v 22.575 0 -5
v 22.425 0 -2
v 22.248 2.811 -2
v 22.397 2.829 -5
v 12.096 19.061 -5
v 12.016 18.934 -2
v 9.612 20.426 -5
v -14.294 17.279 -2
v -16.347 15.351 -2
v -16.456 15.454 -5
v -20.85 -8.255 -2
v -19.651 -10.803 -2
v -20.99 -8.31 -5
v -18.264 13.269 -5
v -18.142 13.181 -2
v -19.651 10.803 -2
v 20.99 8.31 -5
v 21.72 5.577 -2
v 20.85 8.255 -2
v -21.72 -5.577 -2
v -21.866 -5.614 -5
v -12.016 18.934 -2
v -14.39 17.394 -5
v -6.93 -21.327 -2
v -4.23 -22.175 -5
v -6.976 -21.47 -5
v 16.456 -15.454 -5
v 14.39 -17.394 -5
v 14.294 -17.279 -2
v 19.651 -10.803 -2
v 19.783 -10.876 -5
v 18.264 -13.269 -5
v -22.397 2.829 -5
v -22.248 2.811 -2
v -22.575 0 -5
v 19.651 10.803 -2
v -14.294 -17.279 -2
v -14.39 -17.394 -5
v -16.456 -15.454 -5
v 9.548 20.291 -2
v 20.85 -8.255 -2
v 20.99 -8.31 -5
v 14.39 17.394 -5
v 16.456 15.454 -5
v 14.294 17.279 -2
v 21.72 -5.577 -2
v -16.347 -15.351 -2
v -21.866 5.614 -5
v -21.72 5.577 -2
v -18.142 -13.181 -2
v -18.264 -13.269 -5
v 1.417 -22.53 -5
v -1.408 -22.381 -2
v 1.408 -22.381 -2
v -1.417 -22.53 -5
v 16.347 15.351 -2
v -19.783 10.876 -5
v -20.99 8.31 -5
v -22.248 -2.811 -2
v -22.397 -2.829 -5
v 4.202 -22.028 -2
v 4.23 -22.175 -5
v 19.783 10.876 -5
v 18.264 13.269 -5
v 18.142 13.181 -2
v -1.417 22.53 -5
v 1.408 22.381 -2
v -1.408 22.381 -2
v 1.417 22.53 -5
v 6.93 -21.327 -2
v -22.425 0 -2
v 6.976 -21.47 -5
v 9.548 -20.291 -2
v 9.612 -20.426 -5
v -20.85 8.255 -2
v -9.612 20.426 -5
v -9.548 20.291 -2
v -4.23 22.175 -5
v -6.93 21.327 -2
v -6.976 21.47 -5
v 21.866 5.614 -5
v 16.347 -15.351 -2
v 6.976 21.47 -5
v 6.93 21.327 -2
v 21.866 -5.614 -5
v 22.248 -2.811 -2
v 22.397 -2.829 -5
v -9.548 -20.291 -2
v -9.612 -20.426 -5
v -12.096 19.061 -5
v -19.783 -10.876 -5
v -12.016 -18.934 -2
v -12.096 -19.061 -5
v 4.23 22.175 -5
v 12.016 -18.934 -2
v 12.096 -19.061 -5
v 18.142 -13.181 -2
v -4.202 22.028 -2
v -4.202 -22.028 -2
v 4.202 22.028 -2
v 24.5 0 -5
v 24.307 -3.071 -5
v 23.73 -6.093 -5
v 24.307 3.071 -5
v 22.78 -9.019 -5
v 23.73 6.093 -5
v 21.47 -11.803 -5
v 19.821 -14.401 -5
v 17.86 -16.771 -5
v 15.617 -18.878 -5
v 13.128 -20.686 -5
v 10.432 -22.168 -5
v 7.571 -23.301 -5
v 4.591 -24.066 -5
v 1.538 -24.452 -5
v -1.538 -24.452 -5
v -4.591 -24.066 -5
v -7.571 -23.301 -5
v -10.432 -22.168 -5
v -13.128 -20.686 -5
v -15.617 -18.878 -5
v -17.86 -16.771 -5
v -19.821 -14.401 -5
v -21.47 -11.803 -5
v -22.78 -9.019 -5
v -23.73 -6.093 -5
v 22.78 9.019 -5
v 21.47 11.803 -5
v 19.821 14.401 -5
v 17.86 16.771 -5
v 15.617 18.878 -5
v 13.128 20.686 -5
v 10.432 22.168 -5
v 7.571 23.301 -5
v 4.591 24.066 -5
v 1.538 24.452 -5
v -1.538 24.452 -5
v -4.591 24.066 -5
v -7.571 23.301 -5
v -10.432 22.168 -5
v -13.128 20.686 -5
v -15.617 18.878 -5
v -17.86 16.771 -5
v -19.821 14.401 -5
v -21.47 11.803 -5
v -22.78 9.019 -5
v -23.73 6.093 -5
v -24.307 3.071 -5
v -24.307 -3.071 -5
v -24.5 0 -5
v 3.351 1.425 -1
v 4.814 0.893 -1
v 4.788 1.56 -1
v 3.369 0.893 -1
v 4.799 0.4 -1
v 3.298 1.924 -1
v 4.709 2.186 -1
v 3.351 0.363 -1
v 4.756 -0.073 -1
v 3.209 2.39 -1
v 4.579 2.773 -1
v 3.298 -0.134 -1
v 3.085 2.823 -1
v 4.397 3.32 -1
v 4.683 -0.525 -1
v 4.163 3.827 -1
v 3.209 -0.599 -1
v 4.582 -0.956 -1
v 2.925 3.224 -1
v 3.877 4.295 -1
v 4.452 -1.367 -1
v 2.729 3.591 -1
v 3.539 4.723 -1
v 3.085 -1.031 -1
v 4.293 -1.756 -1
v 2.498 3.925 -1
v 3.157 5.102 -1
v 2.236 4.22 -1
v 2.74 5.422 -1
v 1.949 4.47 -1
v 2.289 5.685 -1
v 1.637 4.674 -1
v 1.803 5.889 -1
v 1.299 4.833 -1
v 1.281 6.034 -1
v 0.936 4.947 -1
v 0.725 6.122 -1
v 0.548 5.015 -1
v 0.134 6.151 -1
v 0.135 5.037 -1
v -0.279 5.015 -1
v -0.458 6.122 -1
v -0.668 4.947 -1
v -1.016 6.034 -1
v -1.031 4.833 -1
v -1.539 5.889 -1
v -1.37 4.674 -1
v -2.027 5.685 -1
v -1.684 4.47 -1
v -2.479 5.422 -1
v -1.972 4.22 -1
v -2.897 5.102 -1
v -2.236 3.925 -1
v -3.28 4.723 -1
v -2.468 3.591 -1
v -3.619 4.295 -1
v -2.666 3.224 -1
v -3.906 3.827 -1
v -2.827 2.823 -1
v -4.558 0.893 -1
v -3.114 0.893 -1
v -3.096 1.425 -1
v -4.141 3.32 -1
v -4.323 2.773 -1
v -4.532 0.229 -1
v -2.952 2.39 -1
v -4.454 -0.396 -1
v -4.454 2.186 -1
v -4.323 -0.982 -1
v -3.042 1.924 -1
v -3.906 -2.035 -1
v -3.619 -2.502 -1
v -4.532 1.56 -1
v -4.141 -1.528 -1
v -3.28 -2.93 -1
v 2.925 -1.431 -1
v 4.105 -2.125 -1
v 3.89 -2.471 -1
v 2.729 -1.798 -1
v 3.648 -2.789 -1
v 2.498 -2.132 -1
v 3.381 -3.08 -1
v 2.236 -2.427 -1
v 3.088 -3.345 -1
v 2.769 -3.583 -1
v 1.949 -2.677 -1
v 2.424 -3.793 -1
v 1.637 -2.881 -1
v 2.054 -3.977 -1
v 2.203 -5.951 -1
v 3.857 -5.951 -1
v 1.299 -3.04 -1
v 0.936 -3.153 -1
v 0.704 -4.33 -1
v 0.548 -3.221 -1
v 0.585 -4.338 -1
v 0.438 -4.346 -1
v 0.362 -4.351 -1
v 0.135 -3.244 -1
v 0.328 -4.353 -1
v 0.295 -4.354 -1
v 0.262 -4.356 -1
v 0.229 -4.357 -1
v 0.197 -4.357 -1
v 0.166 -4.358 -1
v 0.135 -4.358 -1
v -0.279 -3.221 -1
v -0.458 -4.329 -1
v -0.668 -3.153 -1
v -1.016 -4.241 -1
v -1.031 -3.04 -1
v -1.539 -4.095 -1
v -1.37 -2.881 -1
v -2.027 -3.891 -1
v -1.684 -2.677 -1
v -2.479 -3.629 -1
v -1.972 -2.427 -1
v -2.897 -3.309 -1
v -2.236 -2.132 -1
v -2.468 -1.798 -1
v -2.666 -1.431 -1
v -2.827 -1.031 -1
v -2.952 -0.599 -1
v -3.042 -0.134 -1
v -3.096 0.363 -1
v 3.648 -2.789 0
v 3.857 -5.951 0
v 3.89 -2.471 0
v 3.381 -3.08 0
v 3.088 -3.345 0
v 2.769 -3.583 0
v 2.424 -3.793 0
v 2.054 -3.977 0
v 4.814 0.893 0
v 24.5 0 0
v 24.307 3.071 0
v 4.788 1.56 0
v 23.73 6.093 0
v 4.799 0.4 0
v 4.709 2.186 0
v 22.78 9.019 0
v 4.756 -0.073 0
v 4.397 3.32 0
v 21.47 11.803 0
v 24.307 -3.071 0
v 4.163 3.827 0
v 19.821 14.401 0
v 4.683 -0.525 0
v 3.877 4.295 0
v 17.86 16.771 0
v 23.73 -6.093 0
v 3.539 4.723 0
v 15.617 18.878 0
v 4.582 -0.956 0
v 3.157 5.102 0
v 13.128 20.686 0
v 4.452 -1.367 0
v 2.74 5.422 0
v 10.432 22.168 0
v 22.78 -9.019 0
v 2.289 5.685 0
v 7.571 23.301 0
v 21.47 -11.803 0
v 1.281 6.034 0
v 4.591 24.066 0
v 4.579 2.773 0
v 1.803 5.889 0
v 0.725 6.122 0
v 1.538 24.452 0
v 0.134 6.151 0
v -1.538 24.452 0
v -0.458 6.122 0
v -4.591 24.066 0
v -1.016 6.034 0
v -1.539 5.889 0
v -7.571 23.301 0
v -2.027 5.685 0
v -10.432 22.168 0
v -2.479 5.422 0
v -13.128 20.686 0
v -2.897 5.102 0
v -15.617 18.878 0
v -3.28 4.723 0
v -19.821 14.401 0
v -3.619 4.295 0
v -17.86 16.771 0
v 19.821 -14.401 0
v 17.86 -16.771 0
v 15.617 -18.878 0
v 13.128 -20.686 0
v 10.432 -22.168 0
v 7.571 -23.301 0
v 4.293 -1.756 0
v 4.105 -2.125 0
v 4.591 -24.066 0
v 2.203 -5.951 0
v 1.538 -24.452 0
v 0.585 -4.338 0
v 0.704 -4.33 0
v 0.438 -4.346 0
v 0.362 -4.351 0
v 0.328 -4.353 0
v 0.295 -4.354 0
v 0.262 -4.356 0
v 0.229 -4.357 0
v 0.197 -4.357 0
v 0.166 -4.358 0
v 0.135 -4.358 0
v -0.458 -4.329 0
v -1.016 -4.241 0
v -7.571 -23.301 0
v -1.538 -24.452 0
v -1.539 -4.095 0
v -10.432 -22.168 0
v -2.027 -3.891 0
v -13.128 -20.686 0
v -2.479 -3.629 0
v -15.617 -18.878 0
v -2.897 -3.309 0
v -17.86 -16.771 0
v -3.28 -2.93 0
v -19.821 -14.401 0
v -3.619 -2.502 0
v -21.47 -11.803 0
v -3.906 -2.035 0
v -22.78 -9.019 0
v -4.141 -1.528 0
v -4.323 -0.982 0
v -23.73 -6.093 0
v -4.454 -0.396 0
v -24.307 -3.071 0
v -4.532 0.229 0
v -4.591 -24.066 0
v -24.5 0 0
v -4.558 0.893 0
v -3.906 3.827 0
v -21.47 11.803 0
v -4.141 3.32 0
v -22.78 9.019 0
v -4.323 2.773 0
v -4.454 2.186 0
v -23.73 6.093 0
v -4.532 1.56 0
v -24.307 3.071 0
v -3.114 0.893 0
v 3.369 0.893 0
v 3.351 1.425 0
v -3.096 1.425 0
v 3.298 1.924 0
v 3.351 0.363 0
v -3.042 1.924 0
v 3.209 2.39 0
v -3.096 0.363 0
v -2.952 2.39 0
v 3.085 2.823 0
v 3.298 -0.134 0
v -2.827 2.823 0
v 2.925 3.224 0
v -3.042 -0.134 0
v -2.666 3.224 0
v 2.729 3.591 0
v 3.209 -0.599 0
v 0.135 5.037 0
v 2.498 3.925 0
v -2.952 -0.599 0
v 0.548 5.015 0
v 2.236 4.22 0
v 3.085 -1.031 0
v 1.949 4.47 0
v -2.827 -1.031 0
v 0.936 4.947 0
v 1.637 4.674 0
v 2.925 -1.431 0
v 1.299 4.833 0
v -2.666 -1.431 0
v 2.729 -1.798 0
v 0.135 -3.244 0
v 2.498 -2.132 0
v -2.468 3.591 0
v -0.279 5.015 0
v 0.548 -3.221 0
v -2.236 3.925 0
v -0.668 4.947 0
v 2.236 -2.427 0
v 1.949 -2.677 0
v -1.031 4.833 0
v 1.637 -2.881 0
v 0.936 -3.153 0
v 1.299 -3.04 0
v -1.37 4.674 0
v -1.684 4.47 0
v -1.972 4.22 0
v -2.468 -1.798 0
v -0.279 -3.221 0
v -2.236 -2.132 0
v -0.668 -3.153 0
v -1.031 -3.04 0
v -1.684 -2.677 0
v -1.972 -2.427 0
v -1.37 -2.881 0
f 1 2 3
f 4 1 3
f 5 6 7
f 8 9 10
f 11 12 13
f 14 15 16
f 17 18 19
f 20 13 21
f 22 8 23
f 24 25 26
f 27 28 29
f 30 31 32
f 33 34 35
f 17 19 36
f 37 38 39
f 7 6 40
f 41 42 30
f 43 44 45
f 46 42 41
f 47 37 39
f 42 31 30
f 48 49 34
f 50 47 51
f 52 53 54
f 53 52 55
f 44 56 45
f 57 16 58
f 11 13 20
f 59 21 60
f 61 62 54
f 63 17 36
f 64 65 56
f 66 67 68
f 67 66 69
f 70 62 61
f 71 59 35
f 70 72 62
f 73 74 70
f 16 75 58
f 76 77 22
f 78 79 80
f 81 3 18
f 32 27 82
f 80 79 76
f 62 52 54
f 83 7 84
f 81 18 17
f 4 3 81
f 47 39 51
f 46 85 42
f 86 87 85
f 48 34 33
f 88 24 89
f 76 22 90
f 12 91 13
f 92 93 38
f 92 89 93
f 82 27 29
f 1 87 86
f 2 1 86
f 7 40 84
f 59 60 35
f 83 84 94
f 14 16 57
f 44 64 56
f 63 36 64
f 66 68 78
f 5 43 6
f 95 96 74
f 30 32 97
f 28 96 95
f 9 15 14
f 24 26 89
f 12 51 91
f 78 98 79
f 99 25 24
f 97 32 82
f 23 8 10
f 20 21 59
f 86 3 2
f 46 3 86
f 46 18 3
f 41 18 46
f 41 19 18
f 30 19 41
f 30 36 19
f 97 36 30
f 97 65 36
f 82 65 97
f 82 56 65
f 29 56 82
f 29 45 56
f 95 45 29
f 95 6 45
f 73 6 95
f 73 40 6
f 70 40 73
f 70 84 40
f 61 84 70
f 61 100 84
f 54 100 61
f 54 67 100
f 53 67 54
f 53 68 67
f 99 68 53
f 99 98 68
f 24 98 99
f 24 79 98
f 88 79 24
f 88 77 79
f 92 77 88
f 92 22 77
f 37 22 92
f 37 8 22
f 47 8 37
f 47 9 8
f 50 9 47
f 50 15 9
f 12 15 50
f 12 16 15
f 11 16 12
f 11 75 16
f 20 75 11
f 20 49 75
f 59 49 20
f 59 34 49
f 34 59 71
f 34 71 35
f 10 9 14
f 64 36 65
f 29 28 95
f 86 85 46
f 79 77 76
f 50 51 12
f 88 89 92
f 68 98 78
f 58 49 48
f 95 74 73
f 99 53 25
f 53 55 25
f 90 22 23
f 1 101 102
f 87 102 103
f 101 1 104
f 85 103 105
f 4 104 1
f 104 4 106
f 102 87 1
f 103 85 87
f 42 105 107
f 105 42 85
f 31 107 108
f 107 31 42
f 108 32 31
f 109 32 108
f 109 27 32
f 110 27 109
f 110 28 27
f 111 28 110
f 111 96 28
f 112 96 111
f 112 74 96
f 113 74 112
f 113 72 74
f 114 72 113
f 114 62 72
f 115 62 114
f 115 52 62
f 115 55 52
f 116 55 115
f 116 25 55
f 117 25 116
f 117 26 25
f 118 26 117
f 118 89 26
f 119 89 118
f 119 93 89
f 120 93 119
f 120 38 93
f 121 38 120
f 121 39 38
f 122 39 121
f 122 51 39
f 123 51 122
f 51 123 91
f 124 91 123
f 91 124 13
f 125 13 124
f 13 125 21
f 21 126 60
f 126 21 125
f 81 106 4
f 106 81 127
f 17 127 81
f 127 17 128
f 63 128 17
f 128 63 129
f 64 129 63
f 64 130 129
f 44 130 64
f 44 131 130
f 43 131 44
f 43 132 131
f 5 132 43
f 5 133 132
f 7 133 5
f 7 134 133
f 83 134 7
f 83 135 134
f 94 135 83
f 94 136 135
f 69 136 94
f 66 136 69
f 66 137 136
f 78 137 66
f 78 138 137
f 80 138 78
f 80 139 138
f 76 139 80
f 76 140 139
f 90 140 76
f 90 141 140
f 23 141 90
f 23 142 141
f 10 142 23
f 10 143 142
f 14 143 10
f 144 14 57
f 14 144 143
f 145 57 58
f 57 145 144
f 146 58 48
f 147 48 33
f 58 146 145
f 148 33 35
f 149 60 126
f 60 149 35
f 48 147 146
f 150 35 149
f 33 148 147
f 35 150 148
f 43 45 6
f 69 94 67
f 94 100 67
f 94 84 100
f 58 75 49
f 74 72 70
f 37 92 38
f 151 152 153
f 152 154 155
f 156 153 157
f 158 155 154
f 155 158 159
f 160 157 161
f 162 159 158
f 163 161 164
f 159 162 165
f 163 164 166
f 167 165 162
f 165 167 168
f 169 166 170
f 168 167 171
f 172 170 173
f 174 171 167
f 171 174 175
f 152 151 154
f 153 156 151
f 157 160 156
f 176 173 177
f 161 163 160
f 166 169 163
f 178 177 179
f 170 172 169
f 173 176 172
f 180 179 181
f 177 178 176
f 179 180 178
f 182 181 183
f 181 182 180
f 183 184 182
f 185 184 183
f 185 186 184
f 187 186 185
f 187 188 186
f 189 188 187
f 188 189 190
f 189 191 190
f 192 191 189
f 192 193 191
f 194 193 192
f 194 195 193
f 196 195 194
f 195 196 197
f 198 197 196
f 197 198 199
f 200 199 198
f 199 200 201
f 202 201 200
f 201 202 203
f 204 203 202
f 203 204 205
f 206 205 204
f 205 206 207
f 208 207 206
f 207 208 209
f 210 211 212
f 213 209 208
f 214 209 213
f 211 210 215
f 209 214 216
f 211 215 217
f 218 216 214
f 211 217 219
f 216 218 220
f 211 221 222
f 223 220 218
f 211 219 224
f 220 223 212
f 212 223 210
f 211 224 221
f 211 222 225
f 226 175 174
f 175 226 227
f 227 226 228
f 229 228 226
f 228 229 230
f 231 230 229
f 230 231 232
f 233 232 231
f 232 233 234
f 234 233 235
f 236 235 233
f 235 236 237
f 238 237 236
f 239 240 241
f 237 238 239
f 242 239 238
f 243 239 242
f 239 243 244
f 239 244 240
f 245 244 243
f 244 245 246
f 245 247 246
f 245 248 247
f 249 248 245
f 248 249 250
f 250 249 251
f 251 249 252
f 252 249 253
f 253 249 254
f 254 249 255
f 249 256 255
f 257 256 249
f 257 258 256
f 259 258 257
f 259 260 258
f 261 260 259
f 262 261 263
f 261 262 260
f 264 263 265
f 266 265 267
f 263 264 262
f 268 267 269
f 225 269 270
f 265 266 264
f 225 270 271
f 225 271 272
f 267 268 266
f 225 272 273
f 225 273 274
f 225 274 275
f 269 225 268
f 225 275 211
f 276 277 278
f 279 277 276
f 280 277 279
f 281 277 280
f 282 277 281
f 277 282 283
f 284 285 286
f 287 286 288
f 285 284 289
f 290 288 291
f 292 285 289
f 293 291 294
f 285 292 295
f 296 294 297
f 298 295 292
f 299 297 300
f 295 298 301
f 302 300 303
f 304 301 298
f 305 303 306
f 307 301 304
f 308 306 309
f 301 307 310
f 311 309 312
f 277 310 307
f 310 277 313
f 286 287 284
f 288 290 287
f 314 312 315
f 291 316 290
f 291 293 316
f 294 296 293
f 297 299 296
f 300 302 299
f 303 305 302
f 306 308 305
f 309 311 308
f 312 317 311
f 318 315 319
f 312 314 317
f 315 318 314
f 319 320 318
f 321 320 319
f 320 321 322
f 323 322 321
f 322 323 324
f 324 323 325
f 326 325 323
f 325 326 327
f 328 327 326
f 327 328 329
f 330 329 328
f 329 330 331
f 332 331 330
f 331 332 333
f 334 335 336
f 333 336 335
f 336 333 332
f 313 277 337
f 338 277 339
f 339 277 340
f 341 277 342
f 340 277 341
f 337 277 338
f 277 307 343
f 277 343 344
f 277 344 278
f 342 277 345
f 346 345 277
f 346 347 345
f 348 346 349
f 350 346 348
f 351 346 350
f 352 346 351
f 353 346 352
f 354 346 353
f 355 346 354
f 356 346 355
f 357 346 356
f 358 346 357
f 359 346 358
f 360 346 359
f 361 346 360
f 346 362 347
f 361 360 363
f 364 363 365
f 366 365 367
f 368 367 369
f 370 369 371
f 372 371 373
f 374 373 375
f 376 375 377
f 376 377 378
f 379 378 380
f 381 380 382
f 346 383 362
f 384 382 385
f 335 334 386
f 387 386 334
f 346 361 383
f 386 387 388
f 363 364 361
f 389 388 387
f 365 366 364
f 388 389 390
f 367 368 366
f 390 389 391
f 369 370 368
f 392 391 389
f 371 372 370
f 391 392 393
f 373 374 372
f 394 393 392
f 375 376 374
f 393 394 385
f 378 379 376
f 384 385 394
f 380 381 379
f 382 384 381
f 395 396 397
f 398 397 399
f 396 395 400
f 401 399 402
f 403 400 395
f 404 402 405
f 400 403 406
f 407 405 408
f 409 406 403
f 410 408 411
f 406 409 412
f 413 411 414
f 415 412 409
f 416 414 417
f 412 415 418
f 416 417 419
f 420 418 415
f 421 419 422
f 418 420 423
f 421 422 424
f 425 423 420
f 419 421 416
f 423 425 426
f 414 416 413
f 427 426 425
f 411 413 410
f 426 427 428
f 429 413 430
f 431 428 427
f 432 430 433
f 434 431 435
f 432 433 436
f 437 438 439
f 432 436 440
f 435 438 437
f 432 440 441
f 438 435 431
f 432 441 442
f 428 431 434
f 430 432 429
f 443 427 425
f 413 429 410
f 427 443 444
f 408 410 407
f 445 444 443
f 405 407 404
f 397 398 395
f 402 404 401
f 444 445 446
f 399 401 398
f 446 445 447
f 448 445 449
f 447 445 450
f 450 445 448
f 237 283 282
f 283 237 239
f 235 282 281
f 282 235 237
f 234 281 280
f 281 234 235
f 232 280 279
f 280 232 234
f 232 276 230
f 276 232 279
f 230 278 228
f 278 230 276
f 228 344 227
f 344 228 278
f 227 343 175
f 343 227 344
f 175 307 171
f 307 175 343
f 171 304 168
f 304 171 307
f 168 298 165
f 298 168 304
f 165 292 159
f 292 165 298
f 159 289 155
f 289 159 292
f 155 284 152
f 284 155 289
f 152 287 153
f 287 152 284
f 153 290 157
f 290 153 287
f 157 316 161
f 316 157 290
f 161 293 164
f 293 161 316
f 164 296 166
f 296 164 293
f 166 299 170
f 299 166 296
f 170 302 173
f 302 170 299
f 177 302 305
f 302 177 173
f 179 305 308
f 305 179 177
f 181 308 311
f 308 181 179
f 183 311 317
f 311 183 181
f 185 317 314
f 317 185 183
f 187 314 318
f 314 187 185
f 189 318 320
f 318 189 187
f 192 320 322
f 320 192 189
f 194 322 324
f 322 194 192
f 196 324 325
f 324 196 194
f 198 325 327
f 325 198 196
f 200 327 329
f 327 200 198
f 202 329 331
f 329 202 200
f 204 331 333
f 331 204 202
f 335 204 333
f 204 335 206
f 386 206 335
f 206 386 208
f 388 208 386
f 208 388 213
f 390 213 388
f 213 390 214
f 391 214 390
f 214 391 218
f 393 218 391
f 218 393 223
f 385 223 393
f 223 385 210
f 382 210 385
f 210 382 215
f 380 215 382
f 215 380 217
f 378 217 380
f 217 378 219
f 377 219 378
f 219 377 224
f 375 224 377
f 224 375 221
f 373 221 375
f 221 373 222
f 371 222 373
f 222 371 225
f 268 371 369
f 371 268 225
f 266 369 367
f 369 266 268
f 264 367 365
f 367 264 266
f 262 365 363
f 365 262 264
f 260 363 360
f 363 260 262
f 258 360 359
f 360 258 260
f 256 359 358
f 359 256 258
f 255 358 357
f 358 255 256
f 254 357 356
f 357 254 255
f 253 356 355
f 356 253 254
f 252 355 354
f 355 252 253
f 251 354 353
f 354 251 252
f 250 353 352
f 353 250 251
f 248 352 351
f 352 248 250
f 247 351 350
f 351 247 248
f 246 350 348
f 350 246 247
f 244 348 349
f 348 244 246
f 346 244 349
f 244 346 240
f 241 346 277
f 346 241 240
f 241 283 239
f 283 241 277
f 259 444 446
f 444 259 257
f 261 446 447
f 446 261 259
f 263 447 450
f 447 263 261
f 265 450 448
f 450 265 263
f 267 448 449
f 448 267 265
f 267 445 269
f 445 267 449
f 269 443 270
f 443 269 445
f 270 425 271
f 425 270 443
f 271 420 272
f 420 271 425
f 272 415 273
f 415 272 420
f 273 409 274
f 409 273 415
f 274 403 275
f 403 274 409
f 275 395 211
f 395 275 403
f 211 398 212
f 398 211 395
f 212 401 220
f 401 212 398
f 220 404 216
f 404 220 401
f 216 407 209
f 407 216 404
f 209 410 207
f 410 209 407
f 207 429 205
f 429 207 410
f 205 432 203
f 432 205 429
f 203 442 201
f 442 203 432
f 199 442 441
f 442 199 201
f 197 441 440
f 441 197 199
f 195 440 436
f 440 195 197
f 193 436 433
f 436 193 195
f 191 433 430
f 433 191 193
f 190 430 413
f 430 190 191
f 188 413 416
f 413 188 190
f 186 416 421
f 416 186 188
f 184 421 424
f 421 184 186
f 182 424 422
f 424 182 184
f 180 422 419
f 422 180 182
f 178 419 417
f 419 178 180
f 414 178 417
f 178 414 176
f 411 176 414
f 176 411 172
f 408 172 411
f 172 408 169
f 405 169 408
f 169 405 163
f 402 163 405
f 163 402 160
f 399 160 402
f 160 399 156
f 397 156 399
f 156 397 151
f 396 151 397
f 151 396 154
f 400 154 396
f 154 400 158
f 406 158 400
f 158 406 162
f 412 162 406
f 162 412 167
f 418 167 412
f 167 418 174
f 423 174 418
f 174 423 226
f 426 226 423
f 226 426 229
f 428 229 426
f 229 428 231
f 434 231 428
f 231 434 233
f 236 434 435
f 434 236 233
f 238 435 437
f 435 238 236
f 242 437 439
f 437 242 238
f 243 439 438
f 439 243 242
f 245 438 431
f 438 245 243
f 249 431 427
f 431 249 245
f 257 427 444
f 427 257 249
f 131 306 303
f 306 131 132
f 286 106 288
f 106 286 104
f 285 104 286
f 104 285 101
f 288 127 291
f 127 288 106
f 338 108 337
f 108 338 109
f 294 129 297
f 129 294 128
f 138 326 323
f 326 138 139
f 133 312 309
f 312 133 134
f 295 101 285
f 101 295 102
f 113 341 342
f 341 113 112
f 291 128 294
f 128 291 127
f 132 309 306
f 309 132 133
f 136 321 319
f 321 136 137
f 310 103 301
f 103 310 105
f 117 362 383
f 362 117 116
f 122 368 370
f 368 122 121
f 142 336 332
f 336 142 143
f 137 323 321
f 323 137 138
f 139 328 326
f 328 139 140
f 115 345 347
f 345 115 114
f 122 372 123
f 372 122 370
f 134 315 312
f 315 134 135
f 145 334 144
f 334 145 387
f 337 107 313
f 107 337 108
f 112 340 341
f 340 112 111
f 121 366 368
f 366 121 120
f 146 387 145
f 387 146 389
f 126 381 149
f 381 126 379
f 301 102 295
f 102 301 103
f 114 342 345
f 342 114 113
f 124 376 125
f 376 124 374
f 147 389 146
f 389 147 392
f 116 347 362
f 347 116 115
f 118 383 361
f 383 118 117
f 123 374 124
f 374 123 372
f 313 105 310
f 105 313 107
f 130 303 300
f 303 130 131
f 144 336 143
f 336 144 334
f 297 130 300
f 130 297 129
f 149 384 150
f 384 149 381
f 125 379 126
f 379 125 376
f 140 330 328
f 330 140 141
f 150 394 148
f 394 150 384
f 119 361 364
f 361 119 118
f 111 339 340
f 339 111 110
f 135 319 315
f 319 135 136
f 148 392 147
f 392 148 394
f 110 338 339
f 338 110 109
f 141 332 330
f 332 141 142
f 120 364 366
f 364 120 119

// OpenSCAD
$fn = 50;


difference() {
	union() {
		translate(v = [0, 0, -5.0000000000]) {
			cylinder(h = 5, r = 24.5000000000);
		}
	}
	union() {
		#translate(v = [0, 0, -5.0000000000]) {
			cylinder(h = 3, r1 = 22.5750000000, r2 = 22.4250000000);
		}
		translate(v = [0, 0, -1]) {
			linear_extrude(height = 1) {
				text(font = "Impact", halign = "center", size = 10, text = "Q", valign = "center");
			}
		}
	}
}
